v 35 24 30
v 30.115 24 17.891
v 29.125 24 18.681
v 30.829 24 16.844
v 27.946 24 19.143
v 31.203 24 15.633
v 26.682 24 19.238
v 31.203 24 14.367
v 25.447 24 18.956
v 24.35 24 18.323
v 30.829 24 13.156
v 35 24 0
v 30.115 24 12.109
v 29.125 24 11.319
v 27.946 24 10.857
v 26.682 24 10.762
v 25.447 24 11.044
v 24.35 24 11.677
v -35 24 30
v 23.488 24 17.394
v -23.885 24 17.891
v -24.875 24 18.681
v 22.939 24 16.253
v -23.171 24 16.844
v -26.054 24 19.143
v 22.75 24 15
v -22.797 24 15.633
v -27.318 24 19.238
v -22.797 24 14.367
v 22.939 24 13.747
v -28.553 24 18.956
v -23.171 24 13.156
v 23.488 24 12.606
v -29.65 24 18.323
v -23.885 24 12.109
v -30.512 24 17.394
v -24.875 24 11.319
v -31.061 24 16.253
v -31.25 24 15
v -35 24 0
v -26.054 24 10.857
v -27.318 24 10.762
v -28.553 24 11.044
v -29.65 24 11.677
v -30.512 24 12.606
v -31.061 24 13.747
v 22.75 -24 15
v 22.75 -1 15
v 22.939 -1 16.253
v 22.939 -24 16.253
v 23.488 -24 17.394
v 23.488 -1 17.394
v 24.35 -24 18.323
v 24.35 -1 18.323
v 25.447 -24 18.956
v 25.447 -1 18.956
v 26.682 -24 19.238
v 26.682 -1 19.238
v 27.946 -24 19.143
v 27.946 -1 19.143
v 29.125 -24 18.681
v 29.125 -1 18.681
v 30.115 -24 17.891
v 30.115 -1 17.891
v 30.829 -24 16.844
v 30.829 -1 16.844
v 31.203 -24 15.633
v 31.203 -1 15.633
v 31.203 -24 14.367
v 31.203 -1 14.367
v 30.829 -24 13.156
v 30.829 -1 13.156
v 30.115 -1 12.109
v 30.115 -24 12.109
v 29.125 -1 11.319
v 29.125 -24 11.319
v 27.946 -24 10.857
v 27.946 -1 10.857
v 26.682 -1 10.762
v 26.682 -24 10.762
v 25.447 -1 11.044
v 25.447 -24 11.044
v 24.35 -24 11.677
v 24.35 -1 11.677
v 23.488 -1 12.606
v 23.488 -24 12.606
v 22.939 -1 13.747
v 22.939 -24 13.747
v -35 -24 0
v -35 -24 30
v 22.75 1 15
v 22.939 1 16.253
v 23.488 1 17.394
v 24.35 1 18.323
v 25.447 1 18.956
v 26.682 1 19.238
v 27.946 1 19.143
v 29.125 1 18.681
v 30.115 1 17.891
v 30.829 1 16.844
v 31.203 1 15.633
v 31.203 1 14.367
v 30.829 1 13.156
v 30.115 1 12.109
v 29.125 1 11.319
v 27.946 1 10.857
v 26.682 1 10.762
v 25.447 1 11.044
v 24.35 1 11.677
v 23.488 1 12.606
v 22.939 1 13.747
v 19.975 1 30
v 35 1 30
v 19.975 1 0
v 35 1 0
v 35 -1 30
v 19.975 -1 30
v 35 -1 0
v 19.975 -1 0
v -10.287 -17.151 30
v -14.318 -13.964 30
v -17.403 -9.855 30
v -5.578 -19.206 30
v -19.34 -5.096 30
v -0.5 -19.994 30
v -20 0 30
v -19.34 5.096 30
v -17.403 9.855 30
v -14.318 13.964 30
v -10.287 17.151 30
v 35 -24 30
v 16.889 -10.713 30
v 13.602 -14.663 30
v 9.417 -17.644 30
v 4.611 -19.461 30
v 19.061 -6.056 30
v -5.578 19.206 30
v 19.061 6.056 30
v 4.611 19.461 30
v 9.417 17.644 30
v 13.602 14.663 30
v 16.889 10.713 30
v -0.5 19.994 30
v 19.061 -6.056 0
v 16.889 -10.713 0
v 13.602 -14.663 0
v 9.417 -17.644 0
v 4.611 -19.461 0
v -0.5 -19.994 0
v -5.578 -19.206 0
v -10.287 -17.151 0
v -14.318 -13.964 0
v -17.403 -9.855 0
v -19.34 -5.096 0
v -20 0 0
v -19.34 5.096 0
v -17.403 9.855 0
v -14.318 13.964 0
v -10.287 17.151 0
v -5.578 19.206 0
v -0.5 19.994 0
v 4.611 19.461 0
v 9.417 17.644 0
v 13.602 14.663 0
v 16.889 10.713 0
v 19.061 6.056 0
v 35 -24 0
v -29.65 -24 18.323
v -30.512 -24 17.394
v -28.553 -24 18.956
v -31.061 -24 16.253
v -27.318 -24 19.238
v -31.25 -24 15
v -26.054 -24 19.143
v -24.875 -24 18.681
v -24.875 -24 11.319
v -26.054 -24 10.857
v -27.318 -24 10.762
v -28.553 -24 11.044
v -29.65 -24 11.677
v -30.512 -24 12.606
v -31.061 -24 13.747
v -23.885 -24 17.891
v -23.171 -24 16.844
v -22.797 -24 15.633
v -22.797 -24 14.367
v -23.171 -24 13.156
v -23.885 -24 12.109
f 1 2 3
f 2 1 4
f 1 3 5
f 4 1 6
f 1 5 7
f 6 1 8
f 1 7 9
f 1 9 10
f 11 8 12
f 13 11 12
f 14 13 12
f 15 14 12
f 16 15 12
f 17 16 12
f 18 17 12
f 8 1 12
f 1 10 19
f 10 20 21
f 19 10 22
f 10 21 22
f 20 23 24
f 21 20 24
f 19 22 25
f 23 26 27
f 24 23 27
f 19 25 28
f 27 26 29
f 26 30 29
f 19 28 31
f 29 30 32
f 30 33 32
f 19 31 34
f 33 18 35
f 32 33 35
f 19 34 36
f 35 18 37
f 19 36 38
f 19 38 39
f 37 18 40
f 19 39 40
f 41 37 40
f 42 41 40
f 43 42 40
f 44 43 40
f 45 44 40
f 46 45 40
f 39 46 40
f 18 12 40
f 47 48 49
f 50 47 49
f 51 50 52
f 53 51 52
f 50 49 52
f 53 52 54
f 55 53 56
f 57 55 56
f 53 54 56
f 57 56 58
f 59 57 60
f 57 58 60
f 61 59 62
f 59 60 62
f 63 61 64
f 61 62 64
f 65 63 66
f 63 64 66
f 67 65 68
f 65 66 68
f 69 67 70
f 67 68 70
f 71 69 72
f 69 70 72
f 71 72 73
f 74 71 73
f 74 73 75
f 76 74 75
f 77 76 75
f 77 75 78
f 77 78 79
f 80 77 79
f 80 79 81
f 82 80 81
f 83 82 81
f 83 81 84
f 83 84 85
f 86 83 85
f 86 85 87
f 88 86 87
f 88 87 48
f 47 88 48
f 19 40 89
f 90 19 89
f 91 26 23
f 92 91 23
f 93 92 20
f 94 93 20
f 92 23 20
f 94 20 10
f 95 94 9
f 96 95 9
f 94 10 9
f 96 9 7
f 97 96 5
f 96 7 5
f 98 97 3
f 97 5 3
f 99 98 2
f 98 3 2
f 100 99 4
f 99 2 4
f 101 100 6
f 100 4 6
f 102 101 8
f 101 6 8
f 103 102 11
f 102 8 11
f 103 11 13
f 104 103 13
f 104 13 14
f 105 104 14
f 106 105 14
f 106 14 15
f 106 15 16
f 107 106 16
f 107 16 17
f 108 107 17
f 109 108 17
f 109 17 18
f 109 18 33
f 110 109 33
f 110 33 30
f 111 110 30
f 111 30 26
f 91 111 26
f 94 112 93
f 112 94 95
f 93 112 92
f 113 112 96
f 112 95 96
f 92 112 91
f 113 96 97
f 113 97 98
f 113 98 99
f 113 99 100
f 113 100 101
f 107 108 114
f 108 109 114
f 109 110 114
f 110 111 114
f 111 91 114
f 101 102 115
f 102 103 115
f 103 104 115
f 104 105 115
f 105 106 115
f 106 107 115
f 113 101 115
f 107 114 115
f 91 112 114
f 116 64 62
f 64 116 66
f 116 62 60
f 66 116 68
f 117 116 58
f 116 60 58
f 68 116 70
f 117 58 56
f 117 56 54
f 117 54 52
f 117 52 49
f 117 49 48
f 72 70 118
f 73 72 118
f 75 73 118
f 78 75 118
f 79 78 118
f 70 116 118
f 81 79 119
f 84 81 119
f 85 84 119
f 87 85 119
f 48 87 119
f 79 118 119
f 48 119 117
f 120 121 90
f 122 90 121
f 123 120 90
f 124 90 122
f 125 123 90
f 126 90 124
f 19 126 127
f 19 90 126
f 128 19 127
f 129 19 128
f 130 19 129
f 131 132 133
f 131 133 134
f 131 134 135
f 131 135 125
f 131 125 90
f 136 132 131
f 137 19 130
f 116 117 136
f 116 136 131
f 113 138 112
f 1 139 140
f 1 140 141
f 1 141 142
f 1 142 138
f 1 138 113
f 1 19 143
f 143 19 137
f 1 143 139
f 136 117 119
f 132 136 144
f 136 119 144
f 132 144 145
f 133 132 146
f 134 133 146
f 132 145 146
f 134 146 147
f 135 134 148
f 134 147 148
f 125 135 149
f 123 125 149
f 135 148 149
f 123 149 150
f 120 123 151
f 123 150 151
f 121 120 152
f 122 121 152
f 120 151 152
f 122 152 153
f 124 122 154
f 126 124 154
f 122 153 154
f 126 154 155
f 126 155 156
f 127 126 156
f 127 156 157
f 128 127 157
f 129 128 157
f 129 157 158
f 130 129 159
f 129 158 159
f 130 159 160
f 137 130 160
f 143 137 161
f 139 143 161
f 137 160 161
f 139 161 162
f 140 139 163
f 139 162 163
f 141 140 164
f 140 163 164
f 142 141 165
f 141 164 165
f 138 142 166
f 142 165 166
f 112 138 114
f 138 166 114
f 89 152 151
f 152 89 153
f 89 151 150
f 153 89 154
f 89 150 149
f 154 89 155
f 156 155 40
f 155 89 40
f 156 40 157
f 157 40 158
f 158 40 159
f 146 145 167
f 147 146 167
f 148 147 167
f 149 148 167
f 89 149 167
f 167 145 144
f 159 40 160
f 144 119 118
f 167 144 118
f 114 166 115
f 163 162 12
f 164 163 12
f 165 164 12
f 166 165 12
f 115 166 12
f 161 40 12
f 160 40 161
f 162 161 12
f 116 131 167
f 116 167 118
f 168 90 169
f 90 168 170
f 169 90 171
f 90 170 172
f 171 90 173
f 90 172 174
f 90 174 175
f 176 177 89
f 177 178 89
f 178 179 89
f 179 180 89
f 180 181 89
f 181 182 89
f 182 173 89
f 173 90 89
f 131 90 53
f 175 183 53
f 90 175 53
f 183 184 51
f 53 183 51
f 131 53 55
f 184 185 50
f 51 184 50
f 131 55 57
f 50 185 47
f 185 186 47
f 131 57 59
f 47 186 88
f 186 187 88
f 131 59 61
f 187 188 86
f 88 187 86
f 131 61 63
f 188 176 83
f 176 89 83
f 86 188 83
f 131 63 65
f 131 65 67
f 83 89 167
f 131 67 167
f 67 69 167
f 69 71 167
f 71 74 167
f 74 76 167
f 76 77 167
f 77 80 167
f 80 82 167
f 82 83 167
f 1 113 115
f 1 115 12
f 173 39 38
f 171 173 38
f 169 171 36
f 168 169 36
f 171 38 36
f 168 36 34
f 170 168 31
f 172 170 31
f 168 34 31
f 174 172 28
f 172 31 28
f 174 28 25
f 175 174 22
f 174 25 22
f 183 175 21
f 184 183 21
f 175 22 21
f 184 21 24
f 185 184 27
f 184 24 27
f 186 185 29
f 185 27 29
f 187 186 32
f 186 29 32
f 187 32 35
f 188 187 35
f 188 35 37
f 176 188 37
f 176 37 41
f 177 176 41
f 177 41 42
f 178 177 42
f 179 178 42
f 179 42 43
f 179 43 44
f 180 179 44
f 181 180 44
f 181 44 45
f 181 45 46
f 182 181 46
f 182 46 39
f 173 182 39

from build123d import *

# Parameters (mm, degrees)
F1_DEPTH = 30
F2_R     = 4.25
F3_DEPTH = 48.001


with BuildPart() as f1:
    # F0 (on Top) → F1 (new body)
    with BuildSketch(Plane.XY):
        with BuildLine():
            Line((35, 24), (-35, 24))
            Line((-35, 24), (-35, -24))
            Line((-35, -24), (35, -24))
            Line((35, -24), (35, -1))
            Line((35, -1), (19.974984, -1))
            ThreePointArc((19.974984, -1), (-20, 0), (19.974984, 1))
            Line((19.974984, 1), (35, 1))
            Line((35, 1), (35, 24))
        make_face()
    extrude(amount=F1_DEPTH)

    # F2 (on face) → F3 (cut, through all)
    with BuildSketch(Plane(origin=(0, 24, 0), x_dir=(-1, 0, 0), z_dir=(0, 1, 0))):
        with Locations((27, 15)):
            Circle(F2_R)
        with Locations((-27, 15)):
            Circle(F2_R)
    extrude(amount=-F3_DEPTH, mode=Mode.SUBTRACT)


solid = f1.part
